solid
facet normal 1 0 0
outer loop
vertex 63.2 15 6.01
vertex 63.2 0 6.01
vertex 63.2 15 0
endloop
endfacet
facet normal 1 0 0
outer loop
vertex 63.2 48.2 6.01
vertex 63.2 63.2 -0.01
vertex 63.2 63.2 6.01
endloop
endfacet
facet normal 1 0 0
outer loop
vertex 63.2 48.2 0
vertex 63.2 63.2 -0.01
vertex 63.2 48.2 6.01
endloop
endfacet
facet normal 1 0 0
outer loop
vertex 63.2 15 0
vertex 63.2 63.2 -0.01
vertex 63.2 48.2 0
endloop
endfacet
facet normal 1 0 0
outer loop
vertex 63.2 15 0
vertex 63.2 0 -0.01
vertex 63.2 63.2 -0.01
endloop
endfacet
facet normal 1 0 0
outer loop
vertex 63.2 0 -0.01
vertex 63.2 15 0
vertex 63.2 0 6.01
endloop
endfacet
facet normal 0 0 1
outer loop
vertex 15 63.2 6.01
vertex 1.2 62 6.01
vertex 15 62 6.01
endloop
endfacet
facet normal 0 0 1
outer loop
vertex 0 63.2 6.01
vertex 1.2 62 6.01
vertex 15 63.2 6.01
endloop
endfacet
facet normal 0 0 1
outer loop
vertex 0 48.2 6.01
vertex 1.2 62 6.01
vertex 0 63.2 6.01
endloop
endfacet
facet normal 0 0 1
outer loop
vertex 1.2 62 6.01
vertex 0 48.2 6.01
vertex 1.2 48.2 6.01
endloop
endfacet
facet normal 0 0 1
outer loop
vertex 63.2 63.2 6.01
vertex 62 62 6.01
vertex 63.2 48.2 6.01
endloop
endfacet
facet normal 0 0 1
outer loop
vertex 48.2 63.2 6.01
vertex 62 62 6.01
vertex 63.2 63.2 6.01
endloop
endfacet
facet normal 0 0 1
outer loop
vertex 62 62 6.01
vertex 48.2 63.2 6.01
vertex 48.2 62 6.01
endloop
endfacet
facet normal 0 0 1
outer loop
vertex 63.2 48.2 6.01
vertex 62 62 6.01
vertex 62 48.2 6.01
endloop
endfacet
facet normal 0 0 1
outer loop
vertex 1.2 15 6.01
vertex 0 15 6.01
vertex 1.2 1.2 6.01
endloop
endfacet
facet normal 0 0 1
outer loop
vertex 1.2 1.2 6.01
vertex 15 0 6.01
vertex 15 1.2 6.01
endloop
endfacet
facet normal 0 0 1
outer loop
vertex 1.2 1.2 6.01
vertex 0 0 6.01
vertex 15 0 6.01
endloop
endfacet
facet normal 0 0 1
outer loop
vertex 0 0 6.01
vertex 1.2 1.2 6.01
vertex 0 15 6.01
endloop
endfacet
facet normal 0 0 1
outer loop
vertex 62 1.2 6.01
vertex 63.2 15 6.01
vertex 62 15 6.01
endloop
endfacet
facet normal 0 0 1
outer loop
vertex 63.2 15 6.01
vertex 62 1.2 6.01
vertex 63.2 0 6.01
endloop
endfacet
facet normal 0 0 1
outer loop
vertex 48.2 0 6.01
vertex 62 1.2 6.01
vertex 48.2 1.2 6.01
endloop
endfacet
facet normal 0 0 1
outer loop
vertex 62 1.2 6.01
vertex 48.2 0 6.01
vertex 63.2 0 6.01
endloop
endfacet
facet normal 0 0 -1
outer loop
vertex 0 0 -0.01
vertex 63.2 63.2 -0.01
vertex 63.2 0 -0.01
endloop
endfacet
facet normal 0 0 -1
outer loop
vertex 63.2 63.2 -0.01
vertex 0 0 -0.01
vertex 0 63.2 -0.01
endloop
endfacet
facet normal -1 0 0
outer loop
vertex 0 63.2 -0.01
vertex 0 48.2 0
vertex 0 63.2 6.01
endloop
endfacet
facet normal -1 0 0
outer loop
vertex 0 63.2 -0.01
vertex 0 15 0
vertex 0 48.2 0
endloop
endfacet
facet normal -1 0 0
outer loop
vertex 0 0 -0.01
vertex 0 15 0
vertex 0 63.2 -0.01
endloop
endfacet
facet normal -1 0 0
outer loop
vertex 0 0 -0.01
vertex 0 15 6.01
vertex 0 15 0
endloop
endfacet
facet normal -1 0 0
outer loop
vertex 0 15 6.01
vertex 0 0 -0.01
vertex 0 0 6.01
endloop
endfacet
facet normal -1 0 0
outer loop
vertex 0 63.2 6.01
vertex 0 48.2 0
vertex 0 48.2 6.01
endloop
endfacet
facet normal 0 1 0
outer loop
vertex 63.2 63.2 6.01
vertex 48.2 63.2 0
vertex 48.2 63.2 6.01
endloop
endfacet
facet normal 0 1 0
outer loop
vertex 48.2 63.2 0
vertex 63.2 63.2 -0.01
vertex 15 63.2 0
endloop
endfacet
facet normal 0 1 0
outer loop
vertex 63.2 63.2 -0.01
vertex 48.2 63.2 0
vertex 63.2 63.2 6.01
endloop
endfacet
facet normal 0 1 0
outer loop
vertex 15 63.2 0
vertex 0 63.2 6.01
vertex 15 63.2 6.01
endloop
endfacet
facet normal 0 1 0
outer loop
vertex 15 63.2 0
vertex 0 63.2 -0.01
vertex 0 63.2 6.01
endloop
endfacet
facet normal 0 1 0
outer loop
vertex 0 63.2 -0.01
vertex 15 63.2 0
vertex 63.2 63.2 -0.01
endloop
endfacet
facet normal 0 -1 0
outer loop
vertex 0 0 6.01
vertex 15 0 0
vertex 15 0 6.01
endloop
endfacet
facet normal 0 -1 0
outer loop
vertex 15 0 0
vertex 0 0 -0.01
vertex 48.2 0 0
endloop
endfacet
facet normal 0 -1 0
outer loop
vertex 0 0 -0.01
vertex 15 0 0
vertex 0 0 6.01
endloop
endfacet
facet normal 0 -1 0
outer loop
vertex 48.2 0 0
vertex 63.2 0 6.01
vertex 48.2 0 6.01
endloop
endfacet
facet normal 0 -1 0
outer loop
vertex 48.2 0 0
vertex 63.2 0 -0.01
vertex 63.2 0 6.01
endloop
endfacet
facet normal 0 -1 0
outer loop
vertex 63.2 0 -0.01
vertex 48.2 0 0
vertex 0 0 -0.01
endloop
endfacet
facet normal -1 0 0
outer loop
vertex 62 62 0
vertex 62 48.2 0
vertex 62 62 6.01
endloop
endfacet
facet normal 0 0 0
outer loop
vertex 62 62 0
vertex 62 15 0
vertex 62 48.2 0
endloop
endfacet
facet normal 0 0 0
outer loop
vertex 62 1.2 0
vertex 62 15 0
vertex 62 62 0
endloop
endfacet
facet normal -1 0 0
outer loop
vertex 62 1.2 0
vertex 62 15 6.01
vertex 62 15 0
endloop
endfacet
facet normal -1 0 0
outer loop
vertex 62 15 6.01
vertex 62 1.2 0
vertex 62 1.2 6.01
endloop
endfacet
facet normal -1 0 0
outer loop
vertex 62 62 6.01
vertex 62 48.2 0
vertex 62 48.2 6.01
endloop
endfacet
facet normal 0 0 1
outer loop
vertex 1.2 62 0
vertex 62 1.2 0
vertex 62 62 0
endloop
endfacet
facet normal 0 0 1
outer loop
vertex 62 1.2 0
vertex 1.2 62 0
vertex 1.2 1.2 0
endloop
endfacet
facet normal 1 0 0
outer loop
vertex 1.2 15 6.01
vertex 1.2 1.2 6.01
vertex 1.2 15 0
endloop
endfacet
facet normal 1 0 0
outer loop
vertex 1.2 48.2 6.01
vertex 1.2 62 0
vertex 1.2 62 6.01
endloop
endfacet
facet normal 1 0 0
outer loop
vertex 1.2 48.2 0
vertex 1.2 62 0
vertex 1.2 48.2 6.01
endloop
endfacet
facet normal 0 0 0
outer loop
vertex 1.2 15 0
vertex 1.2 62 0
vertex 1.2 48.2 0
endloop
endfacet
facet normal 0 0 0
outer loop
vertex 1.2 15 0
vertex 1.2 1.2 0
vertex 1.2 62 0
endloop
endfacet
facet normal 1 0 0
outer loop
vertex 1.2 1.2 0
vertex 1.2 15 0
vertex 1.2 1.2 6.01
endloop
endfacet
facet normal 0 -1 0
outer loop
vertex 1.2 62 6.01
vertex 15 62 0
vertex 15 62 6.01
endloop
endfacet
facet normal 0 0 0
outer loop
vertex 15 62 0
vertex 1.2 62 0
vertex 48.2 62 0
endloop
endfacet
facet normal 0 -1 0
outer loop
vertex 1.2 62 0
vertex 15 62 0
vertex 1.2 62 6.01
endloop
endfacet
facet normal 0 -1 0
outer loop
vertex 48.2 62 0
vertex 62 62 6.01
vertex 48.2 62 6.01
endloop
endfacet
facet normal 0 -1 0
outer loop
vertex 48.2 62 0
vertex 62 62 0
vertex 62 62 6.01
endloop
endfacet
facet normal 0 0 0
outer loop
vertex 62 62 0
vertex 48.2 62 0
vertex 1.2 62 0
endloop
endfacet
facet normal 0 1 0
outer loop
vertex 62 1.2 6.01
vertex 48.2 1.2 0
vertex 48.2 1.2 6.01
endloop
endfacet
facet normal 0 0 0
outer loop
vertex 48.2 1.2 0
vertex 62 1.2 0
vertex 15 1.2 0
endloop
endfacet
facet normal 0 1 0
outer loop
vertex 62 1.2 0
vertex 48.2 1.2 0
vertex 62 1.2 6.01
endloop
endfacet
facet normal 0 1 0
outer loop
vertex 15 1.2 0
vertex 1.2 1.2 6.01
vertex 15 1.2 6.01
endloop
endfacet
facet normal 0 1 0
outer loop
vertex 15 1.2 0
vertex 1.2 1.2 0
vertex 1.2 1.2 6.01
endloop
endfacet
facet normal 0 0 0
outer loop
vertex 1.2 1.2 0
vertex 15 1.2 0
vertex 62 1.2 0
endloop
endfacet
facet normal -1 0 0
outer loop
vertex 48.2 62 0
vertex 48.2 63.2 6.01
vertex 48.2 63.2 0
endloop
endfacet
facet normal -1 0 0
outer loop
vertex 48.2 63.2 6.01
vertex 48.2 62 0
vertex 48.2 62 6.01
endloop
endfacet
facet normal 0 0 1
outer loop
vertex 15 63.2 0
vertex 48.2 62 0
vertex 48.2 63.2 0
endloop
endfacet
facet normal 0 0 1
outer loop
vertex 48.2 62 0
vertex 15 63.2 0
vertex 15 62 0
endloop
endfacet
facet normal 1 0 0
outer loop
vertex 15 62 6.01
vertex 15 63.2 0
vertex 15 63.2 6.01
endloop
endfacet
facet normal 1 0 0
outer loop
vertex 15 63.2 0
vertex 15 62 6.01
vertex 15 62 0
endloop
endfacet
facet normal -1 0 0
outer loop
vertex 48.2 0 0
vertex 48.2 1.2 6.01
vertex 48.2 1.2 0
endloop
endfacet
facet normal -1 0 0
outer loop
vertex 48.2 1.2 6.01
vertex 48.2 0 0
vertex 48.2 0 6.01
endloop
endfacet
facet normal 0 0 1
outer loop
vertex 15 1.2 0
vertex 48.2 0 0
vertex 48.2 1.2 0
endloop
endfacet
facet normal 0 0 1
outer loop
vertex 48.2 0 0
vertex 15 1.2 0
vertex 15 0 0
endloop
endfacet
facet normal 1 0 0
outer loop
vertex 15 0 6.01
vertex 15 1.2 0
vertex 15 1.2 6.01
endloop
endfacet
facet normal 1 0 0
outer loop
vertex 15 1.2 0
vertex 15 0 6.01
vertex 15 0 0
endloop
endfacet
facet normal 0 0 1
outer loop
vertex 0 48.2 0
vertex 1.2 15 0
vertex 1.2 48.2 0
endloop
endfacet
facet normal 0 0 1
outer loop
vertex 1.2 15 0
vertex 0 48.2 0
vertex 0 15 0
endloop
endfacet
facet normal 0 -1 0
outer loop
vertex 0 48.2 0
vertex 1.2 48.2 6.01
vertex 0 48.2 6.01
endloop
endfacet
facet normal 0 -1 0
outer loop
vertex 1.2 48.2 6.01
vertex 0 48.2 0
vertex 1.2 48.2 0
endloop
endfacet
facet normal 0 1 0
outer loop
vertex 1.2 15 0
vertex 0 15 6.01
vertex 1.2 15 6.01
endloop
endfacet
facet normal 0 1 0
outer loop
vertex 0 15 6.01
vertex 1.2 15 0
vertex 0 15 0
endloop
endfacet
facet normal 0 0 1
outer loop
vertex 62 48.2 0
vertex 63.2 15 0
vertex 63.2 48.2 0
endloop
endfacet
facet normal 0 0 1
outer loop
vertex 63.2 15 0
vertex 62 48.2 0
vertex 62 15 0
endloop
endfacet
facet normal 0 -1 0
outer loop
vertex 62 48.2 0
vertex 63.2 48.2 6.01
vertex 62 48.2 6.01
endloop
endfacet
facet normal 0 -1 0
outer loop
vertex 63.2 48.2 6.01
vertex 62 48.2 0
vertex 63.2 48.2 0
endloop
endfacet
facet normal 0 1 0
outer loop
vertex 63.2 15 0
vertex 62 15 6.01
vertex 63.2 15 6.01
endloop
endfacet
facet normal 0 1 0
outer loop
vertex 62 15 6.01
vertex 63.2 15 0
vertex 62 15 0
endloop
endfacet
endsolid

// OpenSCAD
// file: ../Base/Boxes.scad
// Fischertechnik Box Foundation
// Pre-designed Boxes

use <Constants.scad>

include <PlacementOptions.scad>

box190Width = 190;
box190Depth = 130;
box130Width = 130;
box130Depth = 95;
boxUsageHeight = 33.9;
boxWallThickness = 2.4;
boxBaseThickness = 1.0;

// getBoxWallThickness()
// Gets the wall thickness of a Fischertechnik Box

function getBoxWallThickness() = boxWallThickness;

// Gets the usable height of a fischertechnik box
function getBoxUsageHeight() = boxUsageHeight;

// Gets the thickness of the Fischertechnik box base.
function getBoxBaseThickness() = boxBaseThickness;

// Gets the usable inner space of a Box 190 as an x/y-list
function getBox190Space() = [
    box190Width - 2*getBoxWallThickness(), 
    box190Depth - 2*getBoxWallThickness() ];

// Imports the Fischertechnik empty box 130x190 mm and places it at position 0,0
// 190x130 are the outer sizes, the inner space is slightly smaller. Use getBox190Space() to get the inner sizes.
// This module needs the STL file "Fischertechnik Box 130x190.stl" in the library path.
// The box is positioned that the usable inner space is at the 0,0,0 position. The

module Box190() {
    translate([-getBoxWallThickness(),-getBoxWallThickness(),-getBoxBaseThickness()])
        import("Fischertechnik Box 130x190.stl", convexity=3);
}

// Gets the usable inner space of a Box 130 as an x/y-list
function getBox130Space() = [
    box130Width - 2*getBoxWallThickness(), 
    box130Depth - 2*getBoxWallThickness() ];

// Imports the Fischertechnik empty box 95x130 mm and places it at position 0,0
// 190x130 are the outer sizes, the inner space is slightly smaller. Use getBox190Space() to get the inner sizes.
// This module needs the STL file "Fischertechnik Box 95x130.stl" in the library path.
// The box is positioned that the usable inner space is at the 0,0,0 position. The

module Box130() {
    translate([-getBoxWallThickness(),-getBoxWallThickness(),-getBoxBaseThickness()])
        import("Fischertechnik Box 95x130.stl", convexity=3);
}

// Creates a web at the specified box walls
// corner 0 = LowerLeft, 1 = UpperLeft, 2 = UpperRight, 3 = LowerRight
// side 0 = LeftOfCorner, 1 = RightOfCorner
// distance = Distance in mm from the corner
// box = inner width and depth of the box (default: Box 190)
// webWidth = length of the web (default is 3 mms)
// webThickness = thickness of the web (default is 1 mm)

module BoxWeb(corner, side, distance, box=getBox190Space(), webWidth=3, webThickness=1.0) {
    sink = getBoxWallThickness()/2;

    width = (corner % 2 == 0) ? 
            (side == LeftOfCorner ? webWidth : webThickness) :
            (side == LeftOfCorner ? webThickness : webWidth);

    depth = (corner % 2 == 0) ? 
            (side == RightOfCorner ? webWidth : webThickness) :
            (side == RightOfCorner ? webThickness : webWidth);
    
    xDiff = corner == LowerLeft ? 
                (side == LeftOfCorner ? -sink : distance) :
            (corner == UpperLeft ?                
                (side == LeftOfCorner ? distance : -sink) :
            (corner == UpperRight ?
                (side == LeftOfCorner ? box.x-webWidth+sink : box.x-distance-webThickness) :
                (side == LeftOfCorner ? box.x-distance-webThickness: box.x-webWidth+sink)));

    yDiff = corner == LowerLeft ? 
                (side == RightOfCorner ? -sink : distance) :
            (corner == UpperLeft ?
                (side == RightOfCorner ? box.y-distance : box.y-webWidth+sink) :
            (corner == UpperRight ?
                (side == RightOfCorner ? box.y-webWidth+sink : box.y-distance) :
                (side == RightOfCorner ? distance : -sink)));
    
    translate([xDiff, yDiff, -getExcess()])
        cube([width, depth, boxUsageHeight + 2*getExcess()]);
}
// file: ../Base/Rotation.scad
// Fischertechnik Box Foundation
// Geometry Helpers Rotation

include <PlacementOptions.scad>

// getRotatedSpace(space, rotation=NoRotation)
// Rotates the space dependent on the specified rotation

function getRotatedSpace(space, rotation=NoRotation) = [
    (rotation == Rotate90 || rotation == Rotate270) ? space.y : space.x,
    (rotation == Rotate90 || rotation == Rotate270) ? space.x : space.y
];

// Rotates the given space around the fixed left lower corner
// space = the space the children needs as width/depth list [width,depth]
// rotation = 0 Rotate0 degrees, 1 Rotate90 degrees, 2 Rotate180 degrees, 3 Rotate270 degrees (equivalent to -90)

module RotateFix(space, rotation=Rotate0) {
    dy = (rotation == Rotate0 || rotation == Rotate270) ? 0 :
        (rotation == Rotate90) ? space.x :
        space.y;
    dx = (rotation < Rotate180) ? 0 :
        (rotation == Rotate180) ? space.x :
        space.y;
    
    translate([dx, dy, 0])
        rotate([0, 0, rotations[rotation]])
            children();
}
// file: ../Base/Alignment.scad
// Fischertechnik Box Foundation
// Geometry Helpers Alignment

include <PlacementOptions.scad>

// getAlignedX(elementWidth, spaceWidth, align=AlignRight, offset=0)
// Gets the aligned X offset of an element with the given
// width in the given space.
// elementWidth = The width of the element to positon
// spaceWidth = The space where the element should be aligned
// align = 0 AlignLeft, 1 AlignCenter, 2 AlignRight
// offset = an optional offset from the aligned position. When
// aligned left or centered, then positive values are in X direction.
// When aligned right then positive values are in negative X direction.

function getAlignedX(elementWidth, spaceWidth, align=AlignRight, offset=0) =
    (align == AlignLeft) ?
        offset :
        ((align == AlignCenter) ?
        (spaceWidth - elementWidth)/2 + offset :
        spaceWidth - offset - elementWidth);

// getAlignedY(elementDepth, spaceDepth, align=AlignTop, offset=0)
// Gets the aligned Y offset of an element with the given
// depth in the given space.
// elementDepth = The depth of the element to positon
// spaceDepth = The space where the element should be aligned
// align = 0 AlignBottom, 1 AlignCenter, 2 AlignTop
// offset = an optional offset from the aligned position. When
// aligned bottom or centered, then positive values are in Y direction.
// When aligned top then positive values are in negative Y direction.

function getAlignedY(elementDepth, spaceDepth, align=AlignTop, offset=0) =
    (align == AlignBottom) ?
        offset :
        ((align == AlignCenter) ?
        (spaceDepth - elementDepth)/2 + offset :
        spaceDepth - offset - elementDepth);
// file: ../Base/Placement.scad
// Fischertechnik Box Foundation
// Geometry Helpers Placement

use <Constants.scad>
use <Alignment.scad>
use <Rotation.scad>
use <Boxes.scad>

include <PlacementOptions.scad>

// Place(x=0, y=0, elementSpace=[0,0], alignX=AlignLeft, alignY=AlignBottom, rotation=Rotate0, boxSpace=getBox190Space())
// Places the child at the specified position
// y = Y-Position. This is a relative position when an X aligment is specified.
// x = X-Position. This is a relative position when an Y aligment is specified.
// elementSpace = space of the element to be placed [x,y]
// alignX = -1=NoAlign, 0 AlignLeft, 1 AlignCenter, 3 AlignRight (elementSpace and boxSpace required!)
// alignY = -1=NoAlign, 2 AlignBottom, 1 AlignCenter, 4 AlignTop (elementSpace and boxSpace required!)
// rotation = 0 Rotate0 0 degrees, 1 Rotate90 90 degrees, 
// 2 Rotate180 180 degrees, 3 Rotate270 270 degrees (equivalent to -90)
// boxSpace = Inner space of the box where the placement occurs [x,y] - default is Box 190x130 inner space

module Place(x=0, y=0, elementSpace=[0,0], 
  alignX=AlignLeft, alignY=AlignBottom, 
  rotation=NoRotation, boxSpace=getBox190Space()) {

    module Position(x, y, space, rotation=Rotate0) {
        translate([x, y, 0])
            RotateFix(space, rotation)
                children(0);
    }

    space = getRotatedSpace(elementSpace, rotation);
    alignedX = getAlignedX(space.x, boxSpace.x, alignX, x);
    alignedY = getAlignedY(space.y, boxSpace.y, alignY, y);
    Position(alignedX, alignedY, elementSpace, rotation)
        children(0);
}

// Center(space=getBox130Space(), elementSpace=[0,0])
// space = Space where the children is centered. For cylinder use centered=true and no elementSpace.
// elementSpace = space of the element to be centered [x,y]

module Center(space=getBox190Space(), elementSpace=[0,0]) {
    translate([(space.x - elementSpace.x) / 2, (space.y - elementSpace.y) / 2])
        children(0);
}

// CenterHorizontal(width=0, y=0, offset=0, space=getBox130Space())
// space = Space where the children is centered. For cylinder use centered=true and no elementSpace.
// elementSpace = space of the element to be centered [x,y]

module CenterHorizontal(width=0, y=0, offset=0, space=getBox190Space()) {
    translate([(space.x - width) / 2 + offset, y])
        children(0);
}

// CenterVertical(depth=0, x=0, offset=0, space=getBox130Space())
// space = Space where the children is centered. For cylinder use centered=true and no elementSpace.
// elementSpace = space of the element to be centered [x,y]

module CenterVerticalal(depth=0, x=0, offset=0, space=getBox190Space()) {
    translate([x, (space.y - depth) / 2 + offset])
        children(0);
}
// file: ../Base/PlacementOptions.scad
// Fischertechnik Box Foundation
// Placement Options

// Alignment
NoAlign = 0;
AlignLeft = 1;
AlignBottom = 2;
AlignCenter = 3;
AlignRight = 4;
AlignTop = 5;

// Element rotation degree steps
rotations = [0, -90, -180, -270];

// Rotation
NoRotation = 0;
Rotate0 = 0;
Rotate90 = 1;
Rotate180 = 2;
Rotate270 = 3;

// Docking (seen from above)
NoDock = -1;
DockLeft = 0;
DockTop = 1;
DockRight = 2;
DockCorner = 2;
DockBottom = 3;

// Web corners
LowerLeft = 0;
UpperLeft = 1;
UpperRight = 2;
LowerRight = 3;

// Web position relative to corner
LeftOfCorner = 0;
RightOfCorner = 1;
// file: ../Base/Constants.scad
// Fischertechnik Box Foundation
// Constants

// Constant values necessary for multiple elements

// Base constants
dividerThickness = 1.2;
excess = 0.01;
fragments = 90;
tolerance = 0.8;

// Gets the thickness of a divider 
function getDividerThickness() = dividerThickness;

// Gets the excess that is used to merge walls into each other
function getExcess() = excess;

// Gets amount of fragments of a cylinder
function getFragments() = fragments;

// Gets the inner tolerance of a frame to each side
function getTolerance() = tolerance;


// Fischertechnik specific constants
axisDiameter = 4;
axisBottomDiameter = axisDiameter + 1;
standardEdgeDistance = 2.5;
standardWebDistance = 11.5;
standardCornerLength = 15;
tubeWallFactor = 1.6;

// Gets axis diameter
function getAxisDiameter() = axisDiameter;

// Gets axis bottom diameter for thicker part at the bottom
function getAxisBottomDiameter() = axisBottomDiameter;

// gets the standard distance to the wall of the box for dockable frames with webs
function getStandardEdgeDistance() = standardEdgeDistance;

// gets the standard distance of each web to the corner of the dockable frame
function getStandardWebDistance() = standardWebDistance;

// gets the standard length of the corner walls of a dockable frame
function getStandardCornerLength() = standardCornerLength;

// gets the wall thickness of a tube.
function getTubeWallThickness() = tubeWallFactor * getDividerThickness();
// main file
// Fischertechnik Box Library
// Frame for Cassette
// 36518

use <../Base/Constants.scad>
use <../ModelBase/Simple.scad>
use <../ModelBase/Complex.scad>

include <../Base/PlacementOptions.scad>

width = 60;
depth = 60;
height = 6;


// getFrameCassetteSpace(alignX, alignY)
// alignX 0=NoAlign 1=AlignLeft 3=AlignCenter 4=AlignRight 
// alignY 0=AlignNo 2=AlignBottom 3=AlignCenter 5=AlignTop
// Gets the space the frame for a cassette needs as width and depth(.x and .y as a list). 

function getFrameCassetteSpace(alignX=NoAlign, alignY=NoAlign) = 
    getDockableEdgedFrameSpace([width, depth, height], alignX, alignY);

// FrameCassette(alignX, alignY)
// Frame for cassette.
// alignX 0=NoAlign 1=AlignLeft 3=AlignCenter 4=AlignRight 
// alignY 0=AlignNo 2=AlignBottom 3=AlignCenter 5=AlignTop

module FrameCassette(alignX=NoAlign, alignY=NoAlign) {
    DockableEdgedFrame([width, depth, height], alignX, alignY);
}

// Test
color("lightgray") {
    FrameCassette();
}
